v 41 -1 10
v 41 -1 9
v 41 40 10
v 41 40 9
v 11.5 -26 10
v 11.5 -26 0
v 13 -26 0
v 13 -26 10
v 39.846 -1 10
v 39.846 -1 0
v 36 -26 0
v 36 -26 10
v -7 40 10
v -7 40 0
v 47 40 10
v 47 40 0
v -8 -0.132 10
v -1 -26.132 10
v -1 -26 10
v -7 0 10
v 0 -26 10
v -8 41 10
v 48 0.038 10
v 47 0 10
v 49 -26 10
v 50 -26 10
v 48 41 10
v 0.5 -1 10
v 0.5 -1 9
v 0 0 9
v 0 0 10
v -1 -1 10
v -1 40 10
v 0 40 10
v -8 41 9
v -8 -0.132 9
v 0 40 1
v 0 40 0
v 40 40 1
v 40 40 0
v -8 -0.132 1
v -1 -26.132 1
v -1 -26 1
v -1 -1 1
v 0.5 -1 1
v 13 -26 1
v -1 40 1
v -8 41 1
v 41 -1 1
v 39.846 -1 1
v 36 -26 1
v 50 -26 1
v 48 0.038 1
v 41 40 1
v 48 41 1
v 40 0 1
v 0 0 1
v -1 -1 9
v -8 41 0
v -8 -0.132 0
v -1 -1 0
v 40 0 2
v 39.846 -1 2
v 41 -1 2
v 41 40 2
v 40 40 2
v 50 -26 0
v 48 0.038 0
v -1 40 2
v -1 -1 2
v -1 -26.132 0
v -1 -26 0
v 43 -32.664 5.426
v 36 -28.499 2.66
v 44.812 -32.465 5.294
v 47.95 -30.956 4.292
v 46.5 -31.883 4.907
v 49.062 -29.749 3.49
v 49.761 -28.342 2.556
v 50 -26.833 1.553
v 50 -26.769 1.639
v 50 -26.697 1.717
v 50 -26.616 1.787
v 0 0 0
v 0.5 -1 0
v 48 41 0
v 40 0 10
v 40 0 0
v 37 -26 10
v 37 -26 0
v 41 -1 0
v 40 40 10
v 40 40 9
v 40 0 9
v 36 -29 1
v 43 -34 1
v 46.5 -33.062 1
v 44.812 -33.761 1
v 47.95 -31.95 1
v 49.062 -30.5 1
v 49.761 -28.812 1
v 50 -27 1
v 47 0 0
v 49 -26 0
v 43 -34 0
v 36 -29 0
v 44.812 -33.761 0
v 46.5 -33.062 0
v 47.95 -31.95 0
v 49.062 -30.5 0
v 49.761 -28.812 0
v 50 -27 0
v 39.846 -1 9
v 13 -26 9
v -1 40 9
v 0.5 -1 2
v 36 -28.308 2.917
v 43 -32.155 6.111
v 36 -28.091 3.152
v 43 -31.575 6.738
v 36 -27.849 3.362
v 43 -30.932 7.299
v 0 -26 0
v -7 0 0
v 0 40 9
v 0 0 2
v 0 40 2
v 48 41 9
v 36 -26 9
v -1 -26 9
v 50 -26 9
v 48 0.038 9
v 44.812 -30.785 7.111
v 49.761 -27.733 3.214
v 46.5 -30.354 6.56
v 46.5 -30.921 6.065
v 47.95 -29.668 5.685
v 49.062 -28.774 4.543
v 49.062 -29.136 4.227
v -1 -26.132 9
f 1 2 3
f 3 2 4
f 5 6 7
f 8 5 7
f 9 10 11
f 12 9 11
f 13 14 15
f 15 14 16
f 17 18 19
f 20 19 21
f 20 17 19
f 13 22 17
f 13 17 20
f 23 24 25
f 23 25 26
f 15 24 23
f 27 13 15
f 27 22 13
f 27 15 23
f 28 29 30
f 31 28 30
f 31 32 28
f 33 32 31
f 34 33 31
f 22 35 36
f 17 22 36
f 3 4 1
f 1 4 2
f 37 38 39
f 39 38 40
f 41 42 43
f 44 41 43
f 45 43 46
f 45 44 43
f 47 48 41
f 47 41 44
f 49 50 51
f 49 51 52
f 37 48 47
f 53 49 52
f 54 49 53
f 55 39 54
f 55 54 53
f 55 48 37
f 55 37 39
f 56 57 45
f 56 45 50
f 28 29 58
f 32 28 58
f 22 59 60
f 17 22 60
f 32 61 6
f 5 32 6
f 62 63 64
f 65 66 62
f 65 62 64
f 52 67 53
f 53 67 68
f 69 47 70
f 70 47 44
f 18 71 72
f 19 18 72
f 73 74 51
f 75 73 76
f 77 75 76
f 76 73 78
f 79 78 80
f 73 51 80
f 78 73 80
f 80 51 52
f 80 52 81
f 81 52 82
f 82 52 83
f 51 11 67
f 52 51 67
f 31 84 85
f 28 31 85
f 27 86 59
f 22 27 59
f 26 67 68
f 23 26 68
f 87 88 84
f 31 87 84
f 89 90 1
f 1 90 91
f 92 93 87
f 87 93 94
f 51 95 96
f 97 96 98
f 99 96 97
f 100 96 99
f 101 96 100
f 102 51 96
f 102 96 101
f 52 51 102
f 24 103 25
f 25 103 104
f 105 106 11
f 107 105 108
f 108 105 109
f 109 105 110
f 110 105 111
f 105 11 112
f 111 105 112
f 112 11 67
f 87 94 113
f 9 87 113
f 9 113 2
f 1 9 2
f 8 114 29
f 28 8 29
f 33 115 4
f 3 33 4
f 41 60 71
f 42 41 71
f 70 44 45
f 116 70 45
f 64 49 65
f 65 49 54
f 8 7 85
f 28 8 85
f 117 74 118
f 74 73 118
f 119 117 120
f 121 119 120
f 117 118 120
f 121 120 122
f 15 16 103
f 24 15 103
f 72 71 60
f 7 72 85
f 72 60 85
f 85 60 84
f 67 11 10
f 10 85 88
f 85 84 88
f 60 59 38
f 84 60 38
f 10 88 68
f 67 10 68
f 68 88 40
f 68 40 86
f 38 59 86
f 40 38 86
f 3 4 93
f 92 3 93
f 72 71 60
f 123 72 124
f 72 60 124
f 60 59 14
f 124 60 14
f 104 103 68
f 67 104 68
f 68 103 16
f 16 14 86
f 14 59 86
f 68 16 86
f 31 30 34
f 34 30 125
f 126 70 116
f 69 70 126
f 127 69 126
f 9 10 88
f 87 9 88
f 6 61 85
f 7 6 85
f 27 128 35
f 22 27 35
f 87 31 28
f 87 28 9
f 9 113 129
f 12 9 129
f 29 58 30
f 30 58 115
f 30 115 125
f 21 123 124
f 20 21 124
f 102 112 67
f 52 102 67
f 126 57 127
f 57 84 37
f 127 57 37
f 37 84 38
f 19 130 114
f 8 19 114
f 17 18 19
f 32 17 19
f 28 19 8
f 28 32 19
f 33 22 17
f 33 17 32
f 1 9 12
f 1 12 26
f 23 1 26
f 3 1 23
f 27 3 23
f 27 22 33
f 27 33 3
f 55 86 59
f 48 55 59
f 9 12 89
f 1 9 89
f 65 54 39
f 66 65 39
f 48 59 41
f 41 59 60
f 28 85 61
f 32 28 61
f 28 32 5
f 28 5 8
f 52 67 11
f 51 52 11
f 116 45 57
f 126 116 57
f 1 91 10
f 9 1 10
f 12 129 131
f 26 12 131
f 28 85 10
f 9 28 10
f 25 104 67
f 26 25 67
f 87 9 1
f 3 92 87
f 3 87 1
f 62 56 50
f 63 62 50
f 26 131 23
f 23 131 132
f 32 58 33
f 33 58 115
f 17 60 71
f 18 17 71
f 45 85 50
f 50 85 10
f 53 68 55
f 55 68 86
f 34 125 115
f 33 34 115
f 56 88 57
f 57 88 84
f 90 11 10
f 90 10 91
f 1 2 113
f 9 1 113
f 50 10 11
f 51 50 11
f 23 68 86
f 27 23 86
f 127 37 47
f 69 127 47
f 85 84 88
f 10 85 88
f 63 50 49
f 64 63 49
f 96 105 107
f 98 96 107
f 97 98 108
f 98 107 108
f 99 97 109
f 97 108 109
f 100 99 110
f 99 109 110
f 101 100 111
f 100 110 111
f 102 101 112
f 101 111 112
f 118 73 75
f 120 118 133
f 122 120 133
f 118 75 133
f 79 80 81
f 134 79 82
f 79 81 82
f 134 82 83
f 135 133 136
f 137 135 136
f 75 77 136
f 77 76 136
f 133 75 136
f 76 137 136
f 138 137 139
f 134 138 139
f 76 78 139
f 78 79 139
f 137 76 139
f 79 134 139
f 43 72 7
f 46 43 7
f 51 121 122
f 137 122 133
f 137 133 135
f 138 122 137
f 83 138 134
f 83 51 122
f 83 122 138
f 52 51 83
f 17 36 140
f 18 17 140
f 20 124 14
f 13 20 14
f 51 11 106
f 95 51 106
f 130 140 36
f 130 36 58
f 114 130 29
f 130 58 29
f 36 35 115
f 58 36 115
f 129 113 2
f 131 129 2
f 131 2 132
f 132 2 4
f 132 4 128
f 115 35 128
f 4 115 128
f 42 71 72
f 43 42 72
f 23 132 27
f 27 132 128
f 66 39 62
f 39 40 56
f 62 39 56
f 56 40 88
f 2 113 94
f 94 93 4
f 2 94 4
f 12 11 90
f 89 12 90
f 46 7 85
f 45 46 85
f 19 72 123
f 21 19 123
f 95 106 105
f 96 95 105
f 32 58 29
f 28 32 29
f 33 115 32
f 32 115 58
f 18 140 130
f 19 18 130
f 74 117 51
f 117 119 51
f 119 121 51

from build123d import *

# Parameters (mm, degrees)
F1_DEPTH       = 1
F2_DEPTH       = 2
F3_DEPTH       = 10
F4_START       = 7
F4_DEPTH       = 1
F5_START       = 8
F5_DEPTH       = 1
F0_W           = 12
F0_H           = 1
F0_W_2         = 1
F6_DEPTH       = 1
F7_ANGLE_START = 33.5916394761
F7_ANGLE       = 18.3474521861


with BuildPart() as f1:
    # F0 (on Top) → F1 (new body)
    with BuildSketch(Plane.XY):
        Polygon((-1, 40), (0, 40), (40, 40), (41, 40), (41, 41), (40, 41), (0, 41), (-1, 41), align=None)
        Polygon((0.5, -1), (0, 0), (0, 40), (-1, 40), (-1, -1), align=None)
        Polygon((-7, 40), (-1, 40), (-1, 41), (-8, 41), (-8, -0.1322605765), (-1, -26.1322605765), (-1, -26), (0, -26), (-7, 0), align=None)
        Polygon((-1, -1), (-1, 40), (-7, 40), (-7, 0), (0, -26), (11.5, -26), (4, -11), align=None)
        Polygon((47, 40), (41, 40), (41, -1), (37, -26), (49, -26), (47, 0), align=None)
        Polygon((40, 40), (40, 0), (39.8461538462, -1), (41, -1), (41, 40), align=None)
        Polygon((41, 41), (41, 40), (47, 40), (47, 0), (49, -26), (50, -26), (48, 0.0384048104), (48, 41), align=None)
        Polygon((40, 0), (0, 0), (0.5, -1), (39.8461538462, -1), align=None)
        Polygon((41, -1), (39.8461538462, -1), (36, -26), (37, -26), align=None)
        Polygon((5.5, -11), (0.5, -1), (-1, -1), (4, -11), align=None)
        Polygon((13, -26), (5.5, -11), (4, -11), (11.5, -26), (12, -26), align=None)
    extrude(amount=F1_DEPTH)

    # F0 (on Top) → F2 (join)
    with BuildSketch(Plane.XY):
        Polygon((0.5, -1), (0, 0), (0, 40), (-1, 40), (-1, -1), align=None)
        Polygon((40, 40), (40, 0), (39.8461538462, -1), (41, -1), (41, 40), align=None)
    extrude(amount=F2_DEPTH)


with BuildPart() as f3:
    # F0 (on Top) → F3 (new body)
    with BuildSketch(Plane.XY):
        Polygon((-7, 40), (-1, 40), (-1, 41), (-8, 41), (-8, -0.1322605765), (-1, -26.1322605765), (-1, -26), (0, -26), (-7, 0), align=None)
        Polygon((-1, 40), (0, 40), (40, 40), (41, 40), (41, 41), (40, 41), (0, 41), (-1, 41), align=None)
        Polygon((41, 41), (41, 40), (47, 40), (47, 0), (49, -26), (50, -26), (48, 0.0384048104), (48, 41), align=None)
    extrude(amount=F3_DEPTH)


with BuildPart() as f3b:
    # F0 (on Top) → F3, piece 2 (new body)
    with BuildSketch(Plane.XY):
        Polygon((40, 0), (0, 0), (0.5, -1), (39.8461538462, -1), align=None)
    extrude(amount=F3_DEPTH)


with BuildPart() as f3c:
    # F0 (on Top) → F3, piece 3 (new body)
    with BuildSketch(Plane.XY):
        Polygon((5.5, -11), (0.5, -1), (-1, -1), (4, -11), align=None)
        Polygon((13, -26), (5.5, -11), (4, -11), (11.5, -26), (12, -26), align=None)
    extrude(amount=F3_DEPTH)


with BuildPart() as f3d:
    # F0 (on Top) → F3, piece 4 (new body)
    with BuildSketch(Plane.XY):
        Polygon((41, -1), (39.8461538462, -1), (36, -26), (37, -26), align=None)
    extrude(amount=F3_DEPTH)


with BuildPart() as f4:
    # F2_face (on face) → F4 (new body)
    with BuildSketch(Plane(origin=(-0.495959596, 19.3777777778, 2), x_dir=(1, 0, 0), z_dir=(0, 0, 1)).offset(F4_START)):
        Polygon((0.995959596, -20.3777777778), (0.495959596, -19.3777777778), (0.495959596, 20.6222222222), (-0.504040404, 20.6222222222), (-0.504040404, -20.3777777778), align=None)
    extrude(amount=F4_DEPTH)


with BuildPart() as f4b:
    # F2_face (on face) → F4, piece 2 (new body)
    with BuildSketch(Plane(origin=(-0.495959596, 19.3777777778, 2), x_dir=(1, 0, 0), z_dir=(0, 0, 1)).offset(F4_START)):
        Polygon((40.495959596, 20.6222222222), (40.495959596, -19.3777777778), (40.3421134421, -20.3777777778), (41.495959596, -20.3777777778), (41.495959596, 20.6222222222), align=None)
    extrude(amount=F4_DEPTH)


with BuildPart() as f5:
    # F2_face1 (on face) → F5 (new body)
    with BuildSketch(Plane(origin=(21.1678733332, 4.5041468317, 1), x_dir=(1, 0, 0), z_dir=(0, 0, 1)).offset(F5_START)):
        Polygon((-22.1678733332, 35.4958531683), (-21.1678733332, 35.4958531683), (18.8321266668, 35.4958531683), (19.8321266668, 35.4958531683), (19.8321266668, -5.5041468317), (18.678280513, -5.5041468317), (14.8321266668, -30.5041468317), (28.8321266668, -30.5041468317), (26.8321266668, -4.4657420213), (26.8321266668, 36.4958531683), (-29.1678733332, 36.4958531683), (-29.1678733332, -4.6364074083), (-22.1678733332, -30.6364074083), (-22.1678733332, -30.5041468317), (-8.1678733332, -30.5041468317), (-20.6678733332, -5.5041468317), (-22.1678733332, -5.5041468317), align=None)
    extrude(amount=F5_DEPTH)


with BuildPart() as f6:
    # F0 (on Top) → F6 (new body)
    with BuildSketch(Plane.XY):
        with Locations((43, -26.5)):
            Rectangle(F0_W, F0_H)
        with Locations((36.5, -26.5)):
            Rectangle(F0_W_2, F0_H)
        Polygon((37, -27), (36, -27), (36, -29), (37, -28.4853821047), align=None)
        with Locations((49.5, -26.5)):
            Rectangle(F0_W_2, F0_H)
        with BuildLine():
            Line((49, -27), (37, -27))
            Line((37, -27), (37, -28.4853821047))
            Line((37, -28.4853821047), (43.3092967715, -32.9920226558))
            ThreePointArc((43.3092967715, -32.9920226558), (47.3506195323, -31.131840956), (49, -27))
        make_face()
        with BuildLine():
            Line((50, -27), (49, -27))
            ThreePointArc((49, -27), (47.3506195323, -31.131840956), (43.3092967715, -32.9920226558))
            Line((43.3092967715, -32.9920226558), (43, -34))
            ThreePointArc((43, -34), (47.9497474683, -31.9497474683), (50, -27))
        make_face()
        Polygon((37, -28.4853821047), (36, -29), (43, -34), (43.3092967715, -32.9920226558), align=None)
    extrude(amount=F6_DEPTH)


with BuildPart() as f7:
    # F6_face (on face) → F7 (revolve)
    with BuildSketch(Plane(origin=(43.2917204613, -29.2087406355, 1), x_dir=(1, 0, 0), z_dir=(0, 0, 1)), mode=Mode.PRIVATE) as f7_sk:
        with BuildLine():
            Line((-7.2917204613, 3.2087406355), (-7.2917204613, 0.2087406355))
            Line((-7.2917204613, 0.2087406355), (-0.2917204613, -4.7912593645))
            ThreePointArc((-0.2917204613, -4.7912593645), (4.658027007, -2.7410068329), (6.7082795387, 2.2087406355))
            Line((6.7082795387, 2.2087406355), (6.7082795387, 3.2087406355))
            Line((6.7082795387, 3.2087406355), (-7.2917204613, 3.2087406355))
        make_face()
    revolve(f7_sk.sketch.rotate(Axis((43, -26, 1), (-1, 0, 0)), F7_ANGLE_START), axis=Axis((43, -26, 1), (-1, 0, 0)), revolution_arc=F7_ANGLE)


solid = Compound([f1.part, f3.part, f3b.part, f3c.part, f3d.part, f4.part, f4b.part, f5.part, f6.part, f7.part])
